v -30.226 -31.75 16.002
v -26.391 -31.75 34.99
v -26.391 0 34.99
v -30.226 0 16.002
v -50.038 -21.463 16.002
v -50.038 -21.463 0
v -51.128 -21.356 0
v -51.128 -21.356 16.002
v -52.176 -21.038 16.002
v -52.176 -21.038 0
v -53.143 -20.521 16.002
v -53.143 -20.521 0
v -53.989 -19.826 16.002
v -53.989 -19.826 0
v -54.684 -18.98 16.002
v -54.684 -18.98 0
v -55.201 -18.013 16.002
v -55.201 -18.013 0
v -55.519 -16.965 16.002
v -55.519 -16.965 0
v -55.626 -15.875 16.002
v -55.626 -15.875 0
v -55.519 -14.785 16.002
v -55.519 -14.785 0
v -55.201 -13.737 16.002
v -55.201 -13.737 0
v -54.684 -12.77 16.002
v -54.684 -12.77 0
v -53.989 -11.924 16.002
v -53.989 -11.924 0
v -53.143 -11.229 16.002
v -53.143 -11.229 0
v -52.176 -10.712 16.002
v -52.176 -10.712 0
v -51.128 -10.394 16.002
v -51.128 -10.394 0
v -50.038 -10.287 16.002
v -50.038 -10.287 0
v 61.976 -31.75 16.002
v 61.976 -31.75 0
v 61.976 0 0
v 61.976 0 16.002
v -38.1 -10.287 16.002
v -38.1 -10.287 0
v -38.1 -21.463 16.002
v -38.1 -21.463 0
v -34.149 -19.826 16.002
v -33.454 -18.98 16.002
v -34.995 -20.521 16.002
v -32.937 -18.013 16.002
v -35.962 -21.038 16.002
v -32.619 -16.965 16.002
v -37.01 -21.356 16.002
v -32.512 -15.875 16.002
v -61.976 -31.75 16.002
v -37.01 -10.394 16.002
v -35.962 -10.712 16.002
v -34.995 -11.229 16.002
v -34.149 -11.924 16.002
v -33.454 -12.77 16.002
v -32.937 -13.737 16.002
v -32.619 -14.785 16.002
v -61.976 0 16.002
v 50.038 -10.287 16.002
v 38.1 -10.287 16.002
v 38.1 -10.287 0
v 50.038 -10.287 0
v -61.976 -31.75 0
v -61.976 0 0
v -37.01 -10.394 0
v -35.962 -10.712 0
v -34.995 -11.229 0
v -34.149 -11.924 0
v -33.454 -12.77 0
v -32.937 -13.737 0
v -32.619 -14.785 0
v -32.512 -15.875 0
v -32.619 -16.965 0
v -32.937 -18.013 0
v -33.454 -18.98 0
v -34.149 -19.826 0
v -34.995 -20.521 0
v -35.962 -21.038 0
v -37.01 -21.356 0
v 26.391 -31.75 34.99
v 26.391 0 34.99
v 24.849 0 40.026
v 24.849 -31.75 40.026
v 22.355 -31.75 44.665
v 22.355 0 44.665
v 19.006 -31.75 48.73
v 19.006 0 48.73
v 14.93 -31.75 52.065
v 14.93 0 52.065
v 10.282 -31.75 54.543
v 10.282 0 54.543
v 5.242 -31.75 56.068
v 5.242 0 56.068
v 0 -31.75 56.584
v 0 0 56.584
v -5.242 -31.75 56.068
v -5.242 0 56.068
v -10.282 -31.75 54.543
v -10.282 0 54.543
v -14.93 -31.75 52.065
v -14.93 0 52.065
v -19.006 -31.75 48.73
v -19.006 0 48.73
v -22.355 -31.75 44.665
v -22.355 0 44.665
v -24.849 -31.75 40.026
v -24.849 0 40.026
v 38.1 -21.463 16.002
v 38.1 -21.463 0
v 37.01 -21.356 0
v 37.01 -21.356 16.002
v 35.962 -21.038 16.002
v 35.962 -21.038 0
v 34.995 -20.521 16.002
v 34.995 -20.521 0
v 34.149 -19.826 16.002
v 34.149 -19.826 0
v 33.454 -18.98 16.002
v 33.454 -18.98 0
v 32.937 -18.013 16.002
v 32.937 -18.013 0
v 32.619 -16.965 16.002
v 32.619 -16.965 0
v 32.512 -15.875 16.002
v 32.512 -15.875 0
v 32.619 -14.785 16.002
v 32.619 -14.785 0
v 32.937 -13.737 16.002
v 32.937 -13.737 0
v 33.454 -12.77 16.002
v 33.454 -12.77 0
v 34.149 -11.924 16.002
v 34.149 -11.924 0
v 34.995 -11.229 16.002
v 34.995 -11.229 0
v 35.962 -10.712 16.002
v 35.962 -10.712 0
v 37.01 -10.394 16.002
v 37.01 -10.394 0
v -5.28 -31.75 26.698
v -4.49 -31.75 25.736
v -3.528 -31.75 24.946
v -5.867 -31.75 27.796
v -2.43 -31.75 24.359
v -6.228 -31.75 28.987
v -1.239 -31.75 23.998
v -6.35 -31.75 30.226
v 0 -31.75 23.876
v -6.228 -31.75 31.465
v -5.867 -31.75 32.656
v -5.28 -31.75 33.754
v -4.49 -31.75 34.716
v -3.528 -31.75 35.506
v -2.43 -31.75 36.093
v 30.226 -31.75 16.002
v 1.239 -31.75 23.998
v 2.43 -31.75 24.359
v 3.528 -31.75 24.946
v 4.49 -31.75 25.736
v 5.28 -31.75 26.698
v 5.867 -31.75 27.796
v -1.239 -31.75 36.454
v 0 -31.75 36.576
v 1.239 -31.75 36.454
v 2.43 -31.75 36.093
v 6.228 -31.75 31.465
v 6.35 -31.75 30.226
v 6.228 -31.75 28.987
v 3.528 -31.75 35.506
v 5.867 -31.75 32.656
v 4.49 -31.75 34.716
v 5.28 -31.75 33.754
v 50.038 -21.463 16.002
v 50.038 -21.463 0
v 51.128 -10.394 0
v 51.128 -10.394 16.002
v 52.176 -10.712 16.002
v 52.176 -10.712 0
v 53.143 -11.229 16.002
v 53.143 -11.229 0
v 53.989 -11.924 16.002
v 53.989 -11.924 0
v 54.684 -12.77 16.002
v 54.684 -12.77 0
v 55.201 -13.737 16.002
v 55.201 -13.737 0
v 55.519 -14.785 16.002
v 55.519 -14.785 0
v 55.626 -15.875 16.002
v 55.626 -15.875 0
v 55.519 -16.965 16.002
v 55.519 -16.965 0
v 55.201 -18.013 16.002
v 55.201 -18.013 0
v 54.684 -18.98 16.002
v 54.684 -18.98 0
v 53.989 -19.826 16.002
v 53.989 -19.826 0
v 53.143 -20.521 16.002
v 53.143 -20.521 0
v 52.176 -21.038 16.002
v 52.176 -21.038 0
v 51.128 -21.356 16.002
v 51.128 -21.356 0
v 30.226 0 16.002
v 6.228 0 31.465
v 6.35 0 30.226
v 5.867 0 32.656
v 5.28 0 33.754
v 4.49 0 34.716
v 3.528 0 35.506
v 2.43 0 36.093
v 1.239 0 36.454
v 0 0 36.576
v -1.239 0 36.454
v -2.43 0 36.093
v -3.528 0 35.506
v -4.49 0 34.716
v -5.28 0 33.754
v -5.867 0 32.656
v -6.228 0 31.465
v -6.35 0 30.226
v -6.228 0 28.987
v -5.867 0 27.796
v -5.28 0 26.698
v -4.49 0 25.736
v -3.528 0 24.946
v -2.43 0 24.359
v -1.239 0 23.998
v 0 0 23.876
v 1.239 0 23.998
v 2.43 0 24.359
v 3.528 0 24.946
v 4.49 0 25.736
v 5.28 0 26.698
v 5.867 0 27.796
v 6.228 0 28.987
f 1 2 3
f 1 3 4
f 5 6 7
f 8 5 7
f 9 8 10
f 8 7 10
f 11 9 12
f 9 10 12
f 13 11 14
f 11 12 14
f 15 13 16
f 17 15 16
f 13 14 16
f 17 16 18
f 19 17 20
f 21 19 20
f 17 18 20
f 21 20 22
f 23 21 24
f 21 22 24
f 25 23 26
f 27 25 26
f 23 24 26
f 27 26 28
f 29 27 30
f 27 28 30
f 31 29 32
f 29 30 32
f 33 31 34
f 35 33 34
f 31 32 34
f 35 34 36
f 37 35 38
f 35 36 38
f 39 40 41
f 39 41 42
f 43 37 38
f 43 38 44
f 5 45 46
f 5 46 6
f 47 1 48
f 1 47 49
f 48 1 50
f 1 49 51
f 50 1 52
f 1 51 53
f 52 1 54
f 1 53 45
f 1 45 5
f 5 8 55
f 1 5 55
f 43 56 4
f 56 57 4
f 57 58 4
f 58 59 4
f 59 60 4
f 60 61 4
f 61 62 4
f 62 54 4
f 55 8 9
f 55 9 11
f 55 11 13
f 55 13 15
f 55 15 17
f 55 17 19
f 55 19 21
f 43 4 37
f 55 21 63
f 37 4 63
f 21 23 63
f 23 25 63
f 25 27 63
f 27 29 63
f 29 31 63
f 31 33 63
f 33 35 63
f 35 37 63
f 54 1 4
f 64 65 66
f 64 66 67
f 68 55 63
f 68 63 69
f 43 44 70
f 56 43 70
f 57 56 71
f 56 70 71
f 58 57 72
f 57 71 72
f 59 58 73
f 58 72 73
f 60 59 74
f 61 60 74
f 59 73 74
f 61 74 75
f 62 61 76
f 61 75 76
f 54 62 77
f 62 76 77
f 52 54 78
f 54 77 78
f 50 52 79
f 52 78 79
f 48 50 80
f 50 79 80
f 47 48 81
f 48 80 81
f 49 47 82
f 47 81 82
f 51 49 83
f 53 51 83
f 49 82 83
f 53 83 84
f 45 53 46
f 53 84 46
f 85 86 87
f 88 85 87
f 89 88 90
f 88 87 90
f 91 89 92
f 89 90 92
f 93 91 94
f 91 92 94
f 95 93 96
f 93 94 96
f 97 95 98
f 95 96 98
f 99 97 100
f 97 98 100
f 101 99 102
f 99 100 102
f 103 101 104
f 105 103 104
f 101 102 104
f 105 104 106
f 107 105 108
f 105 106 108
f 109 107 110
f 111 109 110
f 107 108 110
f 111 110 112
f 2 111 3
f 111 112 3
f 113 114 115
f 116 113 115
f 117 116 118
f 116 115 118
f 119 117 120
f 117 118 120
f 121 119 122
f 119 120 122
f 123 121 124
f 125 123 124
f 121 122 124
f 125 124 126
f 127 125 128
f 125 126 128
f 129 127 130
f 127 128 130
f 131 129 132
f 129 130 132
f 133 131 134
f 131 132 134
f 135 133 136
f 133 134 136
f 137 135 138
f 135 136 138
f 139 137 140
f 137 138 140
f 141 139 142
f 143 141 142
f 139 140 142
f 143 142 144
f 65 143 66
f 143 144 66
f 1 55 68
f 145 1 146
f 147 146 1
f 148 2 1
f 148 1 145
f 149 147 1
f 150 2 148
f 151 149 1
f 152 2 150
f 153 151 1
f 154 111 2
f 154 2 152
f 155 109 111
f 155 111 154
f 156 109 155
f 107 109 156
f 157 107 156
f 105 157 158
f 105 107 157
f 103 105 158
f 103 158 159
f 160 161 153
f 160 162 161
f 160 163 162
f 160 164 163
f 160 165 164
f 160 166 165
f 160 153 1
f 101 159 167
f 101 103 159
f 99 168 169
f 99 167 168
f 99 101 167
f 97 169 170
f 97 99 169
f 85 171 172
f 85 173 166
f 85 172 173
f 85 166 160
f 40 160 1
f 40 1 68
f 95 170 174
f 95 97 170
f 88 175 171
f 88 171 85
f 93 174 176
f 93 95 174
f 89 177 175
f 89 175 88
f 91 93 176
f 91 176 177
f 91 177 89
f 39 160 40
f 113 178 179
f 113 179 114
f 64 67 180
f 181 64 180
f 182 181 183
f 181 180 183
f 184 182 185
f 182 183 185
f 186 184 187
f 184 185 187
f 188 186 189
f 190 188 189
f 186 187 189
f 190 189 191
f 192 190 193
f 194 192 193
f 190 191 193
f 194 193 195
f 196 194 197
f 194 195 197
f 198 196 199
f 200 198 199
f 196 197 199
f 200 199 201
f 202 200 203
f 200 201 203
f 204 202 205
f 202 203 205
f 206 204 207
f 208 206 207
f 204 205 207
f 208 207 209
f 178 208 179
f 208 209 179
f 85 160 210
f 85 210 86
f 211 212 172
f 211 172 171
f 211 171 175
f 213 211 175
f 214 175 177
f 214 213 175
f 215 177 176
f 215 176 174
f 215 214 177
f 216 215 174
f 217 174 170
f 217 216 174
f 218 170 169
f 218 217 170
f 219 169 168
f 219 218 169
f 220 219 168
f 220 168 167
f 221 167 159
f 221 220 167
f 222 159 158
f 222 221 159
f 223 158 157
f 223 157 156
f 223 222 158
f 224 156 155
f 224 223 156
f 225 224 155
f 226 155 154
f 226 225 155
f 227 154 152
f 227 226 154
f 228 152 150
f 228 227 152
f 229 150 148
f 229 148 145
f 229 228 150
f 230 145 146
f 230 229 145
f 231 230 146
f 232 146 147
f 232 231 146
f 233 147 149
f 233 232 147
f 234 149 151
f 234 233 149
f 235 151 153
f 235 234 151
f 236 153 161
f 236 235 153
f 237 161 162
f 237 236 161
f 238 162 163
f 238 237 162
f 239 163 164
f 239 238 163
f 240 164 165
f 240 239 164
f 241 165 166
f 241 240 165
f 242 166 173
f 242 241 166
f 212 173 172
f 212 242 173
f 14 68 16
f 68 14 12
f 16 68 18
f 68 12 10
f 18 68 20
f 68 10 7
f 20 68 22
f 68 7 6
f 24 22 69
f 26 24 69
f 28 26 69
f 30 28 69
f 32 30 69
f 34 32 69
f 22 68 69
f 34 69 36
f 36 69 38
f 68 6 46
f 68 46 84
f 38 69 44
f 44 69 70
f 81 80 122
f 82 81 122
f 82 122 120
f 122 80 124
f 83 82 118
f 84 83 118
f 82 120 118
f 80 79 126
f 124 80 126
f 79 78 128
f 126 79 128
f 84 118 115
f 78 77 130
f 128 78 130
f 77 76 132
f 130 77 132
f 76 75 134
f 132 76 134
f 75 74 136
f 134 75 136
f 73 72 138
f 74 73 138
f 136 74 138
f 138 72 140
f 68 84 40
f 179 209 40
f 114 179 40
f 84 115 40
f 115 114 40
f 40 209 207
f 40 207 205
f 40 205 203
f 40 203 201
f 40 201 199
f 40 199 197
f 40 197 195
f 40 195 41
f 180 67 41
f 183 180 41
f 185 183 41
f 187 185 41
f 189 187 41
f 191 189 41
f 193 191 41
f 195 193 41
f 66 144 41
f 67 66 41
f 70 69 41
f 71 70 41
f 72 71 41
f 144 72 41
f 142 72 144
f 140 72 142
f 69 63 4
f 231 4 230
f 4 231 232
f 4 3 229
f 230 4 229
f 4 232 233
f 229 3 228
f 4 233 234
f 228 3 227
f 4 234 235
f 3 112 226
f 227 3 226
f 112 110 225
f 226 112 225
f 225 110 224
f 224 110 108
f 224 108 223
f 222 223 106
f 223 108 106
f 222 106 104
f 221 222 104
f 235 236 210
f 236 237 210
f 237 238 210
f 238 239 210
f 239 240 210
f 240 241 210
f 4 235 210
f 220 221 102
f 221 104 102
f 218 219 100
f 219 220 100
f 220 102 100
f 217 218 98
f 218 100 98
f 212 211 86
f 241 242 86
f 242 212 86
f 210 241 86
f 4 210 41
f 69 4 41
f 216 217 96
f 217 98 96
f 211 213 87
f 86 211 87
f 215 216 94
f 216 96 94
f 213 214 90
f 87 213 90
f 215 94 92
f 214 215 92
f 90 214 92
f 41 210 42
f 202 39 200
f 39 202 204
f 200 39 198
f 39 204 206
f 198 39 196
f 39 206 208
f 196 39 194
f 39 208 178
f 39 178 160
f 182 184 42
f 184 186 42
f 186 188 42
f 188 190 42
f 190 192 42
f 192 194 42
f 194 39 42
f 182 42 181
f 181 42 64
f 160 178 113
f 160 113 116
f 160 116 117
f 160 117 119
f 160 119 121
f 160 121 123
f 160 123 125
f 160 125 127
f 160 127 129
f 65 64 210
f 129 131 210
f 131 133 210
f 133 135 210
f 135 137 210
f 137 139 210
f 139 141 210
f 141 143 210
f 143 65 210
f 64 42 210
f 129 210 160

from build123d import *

# Parameters (mm, degrees)
F0_R     = 6.35
F1_DEPTH = 31.75
F3_DEPTH = 127


with BuildPart() as f1:
    # F0 (on Front) → F1 (new body)
    with BuildSketch(Plane.XZ):
        with BuildLine():
            Line((-61.976, 16.002), (-61.976, 0))
            Line((-61.976, 0), (61.976, 0))
            Line((61.976, 0), (61.976, 16.002))
            Line((61.976, 16.002), (30.226, 16.002))
            Line((30.226, 16.002), (26.391128, 34.989695))
            ThreePointArc((26.391128, 34.989695), (0, 56.58358), (-26.391128, 34.989695))
            Line((-26.391128, 34.989695), (-30.226, 16.002))
            Line((-30.226, 16.002), (-61.976, 16.002))
        make_face()
        with Locations((0, 30.226)):
            Circle(F0_R, mode=Mode.SUBTRACT)
    extrude(amount=F1_DEPTH)

    # F2 (on face) → F3 (cut)
    with BuildSketch(Plane(origin=(0, 0, 0), x_dir=(1, 0, 0), z_dir=(0, 0, -1))):
        with BuildLine():
            Line((-38.1, 21.463), (-50.038, 21.463))
            ThreePointArc((-50.038, 21.463), (-55.626, 15.875), (-50.038, 10.287))
            Line((-50.038, 10.287), (-38.1, 10.287))
            ThreePointArc((-38.1, 10.287), (-32.512, 15.875), (-38.1, 21.463))
        make_face()
        with BuildLine():
            Line((50.038, 21.463), (38.1, 21.463))
            ThreePointArc((38.1, 21.463), (32.512, 15.875), (38.1, 10.287))
            Line((38.1, 10.287), (50.038, 10.287))
            ThreePointArc((50.038, 10.287), (55.626, 15.875), (50.038, 21.463))
        make_face()
    extrude(amount=-F3_DEPTH, mode=Mode.SUBTRACT)


solid = f1.part
